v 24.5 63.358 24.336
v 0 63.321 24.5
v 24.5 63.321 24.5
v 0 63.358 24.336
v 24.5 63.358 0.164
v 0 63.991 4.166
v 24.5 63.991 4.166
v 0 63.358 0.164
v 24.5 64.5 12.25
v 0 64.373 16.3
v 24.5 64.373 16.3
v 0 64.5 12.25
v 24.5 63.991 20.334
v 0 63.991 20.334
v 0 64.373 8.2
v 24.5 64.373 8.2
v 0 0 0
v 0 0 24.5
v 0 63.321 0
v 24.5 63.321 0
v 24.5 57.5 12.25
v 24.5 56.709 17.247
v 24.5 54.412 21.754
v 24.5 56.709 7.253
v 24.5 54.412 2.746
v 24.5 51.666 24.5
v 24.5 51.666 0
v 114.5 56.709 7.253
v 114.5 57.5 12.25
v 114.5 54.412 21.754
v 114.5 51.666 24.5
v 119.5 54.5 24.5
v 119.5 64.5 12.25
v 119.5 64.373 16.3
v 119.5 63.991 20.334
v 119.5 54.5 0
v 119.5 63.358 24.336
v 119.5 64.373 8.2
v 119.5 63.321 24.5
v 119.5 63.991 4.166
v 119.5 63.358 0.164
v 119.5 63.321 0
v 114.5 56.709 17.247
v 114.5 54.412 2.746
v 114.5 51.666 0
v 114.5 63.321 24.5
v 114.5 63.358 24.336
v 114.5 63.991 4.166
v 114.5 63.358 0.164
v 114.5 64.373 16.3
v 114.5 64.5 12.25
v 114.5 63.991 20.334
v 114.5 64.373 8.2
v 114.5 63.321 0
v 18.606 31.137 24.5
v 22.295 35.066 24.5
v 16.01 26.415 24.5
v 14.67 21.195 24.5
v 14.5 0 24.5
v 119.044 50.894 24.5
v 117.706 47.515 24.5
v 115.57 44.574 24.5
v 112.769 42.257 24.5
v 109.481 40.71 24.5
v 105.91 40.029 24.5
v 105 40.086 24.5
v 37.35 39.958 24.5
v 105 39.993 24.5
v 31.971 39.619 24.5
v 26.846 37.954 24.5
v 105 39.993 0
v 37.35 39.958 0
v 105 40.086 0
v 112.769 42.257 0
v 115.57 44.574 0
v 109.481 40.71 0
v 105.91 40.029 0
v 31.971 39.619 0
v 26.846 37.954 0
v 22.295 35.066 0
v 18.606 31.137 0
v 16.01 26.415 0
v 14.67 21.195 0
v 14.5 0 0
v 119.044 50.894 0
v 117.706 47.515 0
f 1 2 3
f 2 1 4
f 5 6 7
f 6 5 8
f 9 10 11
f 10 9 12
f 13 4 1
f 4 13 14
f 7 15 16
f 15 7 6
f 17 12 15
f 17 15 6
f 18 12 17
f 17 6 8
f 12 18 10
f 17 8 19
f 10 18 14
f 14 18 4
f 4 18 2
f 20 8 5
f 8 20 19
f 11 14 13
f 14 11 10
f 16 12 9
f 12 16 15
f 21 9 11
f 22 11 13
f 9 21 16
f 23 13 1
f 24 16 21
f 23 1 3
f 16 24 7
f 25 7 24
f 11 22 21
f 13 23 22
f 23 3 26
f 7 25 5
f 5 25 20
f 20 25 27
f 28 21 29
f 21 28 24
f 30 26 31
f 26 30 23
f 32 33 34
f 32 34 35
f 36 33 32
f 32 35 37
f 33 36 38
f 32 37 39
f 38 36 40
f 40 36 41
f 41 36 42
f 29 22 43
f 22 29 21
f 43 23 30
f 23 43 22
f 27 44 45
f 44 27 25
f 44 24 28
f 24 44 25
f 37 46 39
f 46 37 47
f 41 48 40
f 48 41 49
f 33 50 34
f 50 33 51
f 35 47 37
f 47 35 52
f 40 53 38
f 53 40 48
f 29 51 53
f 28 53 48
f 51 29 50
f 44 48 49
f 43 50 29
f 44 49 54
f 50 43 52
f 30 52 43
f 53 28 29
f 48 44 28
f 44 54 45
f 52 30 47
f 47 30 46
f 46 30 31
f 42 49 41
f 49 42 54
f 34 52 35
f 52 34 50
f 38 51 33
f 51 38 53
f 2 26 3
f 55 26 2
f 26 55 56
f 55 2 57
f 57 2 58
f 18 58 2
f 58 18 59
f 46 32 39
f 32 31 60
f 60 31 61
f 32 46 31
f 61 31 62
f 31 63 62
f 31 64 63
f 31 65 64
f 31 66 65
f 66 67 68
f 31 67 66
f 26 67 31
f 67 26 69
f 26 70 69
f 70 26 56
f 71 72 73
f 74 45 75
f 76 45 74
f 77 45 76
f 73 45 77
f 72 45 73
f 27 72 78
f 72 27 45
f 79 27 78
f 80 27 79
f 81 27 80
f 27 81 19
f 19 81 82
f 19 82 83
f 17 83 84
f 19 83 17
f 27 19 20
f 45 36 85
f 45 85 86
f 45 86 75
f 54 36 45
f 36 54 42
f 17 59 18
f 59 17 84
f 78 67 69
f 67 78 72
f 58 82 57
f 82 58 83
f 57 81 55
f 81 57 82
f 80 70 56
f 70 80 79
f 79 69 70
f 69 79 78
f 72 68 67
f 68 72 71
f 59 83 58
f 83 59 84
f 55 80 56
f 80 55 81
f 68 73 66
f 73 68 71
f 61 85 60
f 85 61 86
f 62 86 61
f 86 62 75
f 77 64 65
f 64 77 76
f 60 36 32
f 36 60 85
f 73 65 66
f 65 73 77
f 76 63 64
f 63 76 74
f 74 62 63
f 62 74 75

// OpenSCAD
//Height of the tower below the spindle
arm_height = 40;

//Length of the spindle
arm_length = 90;

module tcube(x, y, z, tx = 0, ty = 0, tz = 0) {
	translate([tx, ty, tz]) {
		cube([x, y, z]);
	}
}

module tcyl(r, h, tx = 0, ty = 0, tz = 0, center = false, $fn = $fn) {
	translate([tx, ty, tz]) {
		cylinder(r = r, h = h, center = center, $fn = $fn);
	}
}

module ccube(x, y, z, ty = 0, tz = 0) {
	tcube(x, y, z, -x / 2, ty, tz);
}

module spool_arm() {
	$fn =25;

	//fit of 2 pieces
	clearance = .5;

	hole_x = 15;
	hole_y = 25;
	arm_offset = 10;
	lip_x = 5;
	lip_y = 7;

	module arm() {
		thickness = hole_y - clearance;
		bar = hole_x - clearance;
		spindle_length = bar + arm_length + arm_offset + lip_x;
		spindle_depth = thickness;
		height = arm_height + spindle_depth;
		brace_r = bar + lip_y;
		t2 = thickness + 2;

		module L() {
			difference() {
				tcube(spindle_length, height, thickness);

				hull() {
					tcube(1, 1, t2, spindle_length, height - spindle_depth - 1, -1);
					tcube(1, 1, t2, spindle_length, -1, -1);
					tcube(1, 1, t2, bar, -1, -1);
					tcyl(brace_r, t2, bar + brace_r, height - spindle_depth - brace_r, -1);
				}

				tcube(bar + 1, bar + 1, t2, spindle_length - bar, height - spindle_depth - 1, -1);
			}
			tcyl(bar, thickness, spindle_length - bar, height - spindle_depth + bar);
		}

		module ring() {
			lip_r = height;
			spindle_r = thickness * .66;
			$fn = 100;
			ty = height - spindle_r - lip_y;

			tcyl(lip_r, bar + arm_offset, $fn = $fn);
			tcyl(spindle_r, spindle_length, ty = ty, $fn = 20);
			ccube(2 * spindle_r, ty, spindle_length );
			tcyl(lip_r, lip_x, tz = spindle_length - lip_x, $fn = $fn);
		}

		intersection() {
	
			translate([0, 0, thickness / 2]) {
				rotate([0, 90, 0]) {
					ring();
				}
			}

			L();
		}

	}

	arm();

}

spool_arm();
